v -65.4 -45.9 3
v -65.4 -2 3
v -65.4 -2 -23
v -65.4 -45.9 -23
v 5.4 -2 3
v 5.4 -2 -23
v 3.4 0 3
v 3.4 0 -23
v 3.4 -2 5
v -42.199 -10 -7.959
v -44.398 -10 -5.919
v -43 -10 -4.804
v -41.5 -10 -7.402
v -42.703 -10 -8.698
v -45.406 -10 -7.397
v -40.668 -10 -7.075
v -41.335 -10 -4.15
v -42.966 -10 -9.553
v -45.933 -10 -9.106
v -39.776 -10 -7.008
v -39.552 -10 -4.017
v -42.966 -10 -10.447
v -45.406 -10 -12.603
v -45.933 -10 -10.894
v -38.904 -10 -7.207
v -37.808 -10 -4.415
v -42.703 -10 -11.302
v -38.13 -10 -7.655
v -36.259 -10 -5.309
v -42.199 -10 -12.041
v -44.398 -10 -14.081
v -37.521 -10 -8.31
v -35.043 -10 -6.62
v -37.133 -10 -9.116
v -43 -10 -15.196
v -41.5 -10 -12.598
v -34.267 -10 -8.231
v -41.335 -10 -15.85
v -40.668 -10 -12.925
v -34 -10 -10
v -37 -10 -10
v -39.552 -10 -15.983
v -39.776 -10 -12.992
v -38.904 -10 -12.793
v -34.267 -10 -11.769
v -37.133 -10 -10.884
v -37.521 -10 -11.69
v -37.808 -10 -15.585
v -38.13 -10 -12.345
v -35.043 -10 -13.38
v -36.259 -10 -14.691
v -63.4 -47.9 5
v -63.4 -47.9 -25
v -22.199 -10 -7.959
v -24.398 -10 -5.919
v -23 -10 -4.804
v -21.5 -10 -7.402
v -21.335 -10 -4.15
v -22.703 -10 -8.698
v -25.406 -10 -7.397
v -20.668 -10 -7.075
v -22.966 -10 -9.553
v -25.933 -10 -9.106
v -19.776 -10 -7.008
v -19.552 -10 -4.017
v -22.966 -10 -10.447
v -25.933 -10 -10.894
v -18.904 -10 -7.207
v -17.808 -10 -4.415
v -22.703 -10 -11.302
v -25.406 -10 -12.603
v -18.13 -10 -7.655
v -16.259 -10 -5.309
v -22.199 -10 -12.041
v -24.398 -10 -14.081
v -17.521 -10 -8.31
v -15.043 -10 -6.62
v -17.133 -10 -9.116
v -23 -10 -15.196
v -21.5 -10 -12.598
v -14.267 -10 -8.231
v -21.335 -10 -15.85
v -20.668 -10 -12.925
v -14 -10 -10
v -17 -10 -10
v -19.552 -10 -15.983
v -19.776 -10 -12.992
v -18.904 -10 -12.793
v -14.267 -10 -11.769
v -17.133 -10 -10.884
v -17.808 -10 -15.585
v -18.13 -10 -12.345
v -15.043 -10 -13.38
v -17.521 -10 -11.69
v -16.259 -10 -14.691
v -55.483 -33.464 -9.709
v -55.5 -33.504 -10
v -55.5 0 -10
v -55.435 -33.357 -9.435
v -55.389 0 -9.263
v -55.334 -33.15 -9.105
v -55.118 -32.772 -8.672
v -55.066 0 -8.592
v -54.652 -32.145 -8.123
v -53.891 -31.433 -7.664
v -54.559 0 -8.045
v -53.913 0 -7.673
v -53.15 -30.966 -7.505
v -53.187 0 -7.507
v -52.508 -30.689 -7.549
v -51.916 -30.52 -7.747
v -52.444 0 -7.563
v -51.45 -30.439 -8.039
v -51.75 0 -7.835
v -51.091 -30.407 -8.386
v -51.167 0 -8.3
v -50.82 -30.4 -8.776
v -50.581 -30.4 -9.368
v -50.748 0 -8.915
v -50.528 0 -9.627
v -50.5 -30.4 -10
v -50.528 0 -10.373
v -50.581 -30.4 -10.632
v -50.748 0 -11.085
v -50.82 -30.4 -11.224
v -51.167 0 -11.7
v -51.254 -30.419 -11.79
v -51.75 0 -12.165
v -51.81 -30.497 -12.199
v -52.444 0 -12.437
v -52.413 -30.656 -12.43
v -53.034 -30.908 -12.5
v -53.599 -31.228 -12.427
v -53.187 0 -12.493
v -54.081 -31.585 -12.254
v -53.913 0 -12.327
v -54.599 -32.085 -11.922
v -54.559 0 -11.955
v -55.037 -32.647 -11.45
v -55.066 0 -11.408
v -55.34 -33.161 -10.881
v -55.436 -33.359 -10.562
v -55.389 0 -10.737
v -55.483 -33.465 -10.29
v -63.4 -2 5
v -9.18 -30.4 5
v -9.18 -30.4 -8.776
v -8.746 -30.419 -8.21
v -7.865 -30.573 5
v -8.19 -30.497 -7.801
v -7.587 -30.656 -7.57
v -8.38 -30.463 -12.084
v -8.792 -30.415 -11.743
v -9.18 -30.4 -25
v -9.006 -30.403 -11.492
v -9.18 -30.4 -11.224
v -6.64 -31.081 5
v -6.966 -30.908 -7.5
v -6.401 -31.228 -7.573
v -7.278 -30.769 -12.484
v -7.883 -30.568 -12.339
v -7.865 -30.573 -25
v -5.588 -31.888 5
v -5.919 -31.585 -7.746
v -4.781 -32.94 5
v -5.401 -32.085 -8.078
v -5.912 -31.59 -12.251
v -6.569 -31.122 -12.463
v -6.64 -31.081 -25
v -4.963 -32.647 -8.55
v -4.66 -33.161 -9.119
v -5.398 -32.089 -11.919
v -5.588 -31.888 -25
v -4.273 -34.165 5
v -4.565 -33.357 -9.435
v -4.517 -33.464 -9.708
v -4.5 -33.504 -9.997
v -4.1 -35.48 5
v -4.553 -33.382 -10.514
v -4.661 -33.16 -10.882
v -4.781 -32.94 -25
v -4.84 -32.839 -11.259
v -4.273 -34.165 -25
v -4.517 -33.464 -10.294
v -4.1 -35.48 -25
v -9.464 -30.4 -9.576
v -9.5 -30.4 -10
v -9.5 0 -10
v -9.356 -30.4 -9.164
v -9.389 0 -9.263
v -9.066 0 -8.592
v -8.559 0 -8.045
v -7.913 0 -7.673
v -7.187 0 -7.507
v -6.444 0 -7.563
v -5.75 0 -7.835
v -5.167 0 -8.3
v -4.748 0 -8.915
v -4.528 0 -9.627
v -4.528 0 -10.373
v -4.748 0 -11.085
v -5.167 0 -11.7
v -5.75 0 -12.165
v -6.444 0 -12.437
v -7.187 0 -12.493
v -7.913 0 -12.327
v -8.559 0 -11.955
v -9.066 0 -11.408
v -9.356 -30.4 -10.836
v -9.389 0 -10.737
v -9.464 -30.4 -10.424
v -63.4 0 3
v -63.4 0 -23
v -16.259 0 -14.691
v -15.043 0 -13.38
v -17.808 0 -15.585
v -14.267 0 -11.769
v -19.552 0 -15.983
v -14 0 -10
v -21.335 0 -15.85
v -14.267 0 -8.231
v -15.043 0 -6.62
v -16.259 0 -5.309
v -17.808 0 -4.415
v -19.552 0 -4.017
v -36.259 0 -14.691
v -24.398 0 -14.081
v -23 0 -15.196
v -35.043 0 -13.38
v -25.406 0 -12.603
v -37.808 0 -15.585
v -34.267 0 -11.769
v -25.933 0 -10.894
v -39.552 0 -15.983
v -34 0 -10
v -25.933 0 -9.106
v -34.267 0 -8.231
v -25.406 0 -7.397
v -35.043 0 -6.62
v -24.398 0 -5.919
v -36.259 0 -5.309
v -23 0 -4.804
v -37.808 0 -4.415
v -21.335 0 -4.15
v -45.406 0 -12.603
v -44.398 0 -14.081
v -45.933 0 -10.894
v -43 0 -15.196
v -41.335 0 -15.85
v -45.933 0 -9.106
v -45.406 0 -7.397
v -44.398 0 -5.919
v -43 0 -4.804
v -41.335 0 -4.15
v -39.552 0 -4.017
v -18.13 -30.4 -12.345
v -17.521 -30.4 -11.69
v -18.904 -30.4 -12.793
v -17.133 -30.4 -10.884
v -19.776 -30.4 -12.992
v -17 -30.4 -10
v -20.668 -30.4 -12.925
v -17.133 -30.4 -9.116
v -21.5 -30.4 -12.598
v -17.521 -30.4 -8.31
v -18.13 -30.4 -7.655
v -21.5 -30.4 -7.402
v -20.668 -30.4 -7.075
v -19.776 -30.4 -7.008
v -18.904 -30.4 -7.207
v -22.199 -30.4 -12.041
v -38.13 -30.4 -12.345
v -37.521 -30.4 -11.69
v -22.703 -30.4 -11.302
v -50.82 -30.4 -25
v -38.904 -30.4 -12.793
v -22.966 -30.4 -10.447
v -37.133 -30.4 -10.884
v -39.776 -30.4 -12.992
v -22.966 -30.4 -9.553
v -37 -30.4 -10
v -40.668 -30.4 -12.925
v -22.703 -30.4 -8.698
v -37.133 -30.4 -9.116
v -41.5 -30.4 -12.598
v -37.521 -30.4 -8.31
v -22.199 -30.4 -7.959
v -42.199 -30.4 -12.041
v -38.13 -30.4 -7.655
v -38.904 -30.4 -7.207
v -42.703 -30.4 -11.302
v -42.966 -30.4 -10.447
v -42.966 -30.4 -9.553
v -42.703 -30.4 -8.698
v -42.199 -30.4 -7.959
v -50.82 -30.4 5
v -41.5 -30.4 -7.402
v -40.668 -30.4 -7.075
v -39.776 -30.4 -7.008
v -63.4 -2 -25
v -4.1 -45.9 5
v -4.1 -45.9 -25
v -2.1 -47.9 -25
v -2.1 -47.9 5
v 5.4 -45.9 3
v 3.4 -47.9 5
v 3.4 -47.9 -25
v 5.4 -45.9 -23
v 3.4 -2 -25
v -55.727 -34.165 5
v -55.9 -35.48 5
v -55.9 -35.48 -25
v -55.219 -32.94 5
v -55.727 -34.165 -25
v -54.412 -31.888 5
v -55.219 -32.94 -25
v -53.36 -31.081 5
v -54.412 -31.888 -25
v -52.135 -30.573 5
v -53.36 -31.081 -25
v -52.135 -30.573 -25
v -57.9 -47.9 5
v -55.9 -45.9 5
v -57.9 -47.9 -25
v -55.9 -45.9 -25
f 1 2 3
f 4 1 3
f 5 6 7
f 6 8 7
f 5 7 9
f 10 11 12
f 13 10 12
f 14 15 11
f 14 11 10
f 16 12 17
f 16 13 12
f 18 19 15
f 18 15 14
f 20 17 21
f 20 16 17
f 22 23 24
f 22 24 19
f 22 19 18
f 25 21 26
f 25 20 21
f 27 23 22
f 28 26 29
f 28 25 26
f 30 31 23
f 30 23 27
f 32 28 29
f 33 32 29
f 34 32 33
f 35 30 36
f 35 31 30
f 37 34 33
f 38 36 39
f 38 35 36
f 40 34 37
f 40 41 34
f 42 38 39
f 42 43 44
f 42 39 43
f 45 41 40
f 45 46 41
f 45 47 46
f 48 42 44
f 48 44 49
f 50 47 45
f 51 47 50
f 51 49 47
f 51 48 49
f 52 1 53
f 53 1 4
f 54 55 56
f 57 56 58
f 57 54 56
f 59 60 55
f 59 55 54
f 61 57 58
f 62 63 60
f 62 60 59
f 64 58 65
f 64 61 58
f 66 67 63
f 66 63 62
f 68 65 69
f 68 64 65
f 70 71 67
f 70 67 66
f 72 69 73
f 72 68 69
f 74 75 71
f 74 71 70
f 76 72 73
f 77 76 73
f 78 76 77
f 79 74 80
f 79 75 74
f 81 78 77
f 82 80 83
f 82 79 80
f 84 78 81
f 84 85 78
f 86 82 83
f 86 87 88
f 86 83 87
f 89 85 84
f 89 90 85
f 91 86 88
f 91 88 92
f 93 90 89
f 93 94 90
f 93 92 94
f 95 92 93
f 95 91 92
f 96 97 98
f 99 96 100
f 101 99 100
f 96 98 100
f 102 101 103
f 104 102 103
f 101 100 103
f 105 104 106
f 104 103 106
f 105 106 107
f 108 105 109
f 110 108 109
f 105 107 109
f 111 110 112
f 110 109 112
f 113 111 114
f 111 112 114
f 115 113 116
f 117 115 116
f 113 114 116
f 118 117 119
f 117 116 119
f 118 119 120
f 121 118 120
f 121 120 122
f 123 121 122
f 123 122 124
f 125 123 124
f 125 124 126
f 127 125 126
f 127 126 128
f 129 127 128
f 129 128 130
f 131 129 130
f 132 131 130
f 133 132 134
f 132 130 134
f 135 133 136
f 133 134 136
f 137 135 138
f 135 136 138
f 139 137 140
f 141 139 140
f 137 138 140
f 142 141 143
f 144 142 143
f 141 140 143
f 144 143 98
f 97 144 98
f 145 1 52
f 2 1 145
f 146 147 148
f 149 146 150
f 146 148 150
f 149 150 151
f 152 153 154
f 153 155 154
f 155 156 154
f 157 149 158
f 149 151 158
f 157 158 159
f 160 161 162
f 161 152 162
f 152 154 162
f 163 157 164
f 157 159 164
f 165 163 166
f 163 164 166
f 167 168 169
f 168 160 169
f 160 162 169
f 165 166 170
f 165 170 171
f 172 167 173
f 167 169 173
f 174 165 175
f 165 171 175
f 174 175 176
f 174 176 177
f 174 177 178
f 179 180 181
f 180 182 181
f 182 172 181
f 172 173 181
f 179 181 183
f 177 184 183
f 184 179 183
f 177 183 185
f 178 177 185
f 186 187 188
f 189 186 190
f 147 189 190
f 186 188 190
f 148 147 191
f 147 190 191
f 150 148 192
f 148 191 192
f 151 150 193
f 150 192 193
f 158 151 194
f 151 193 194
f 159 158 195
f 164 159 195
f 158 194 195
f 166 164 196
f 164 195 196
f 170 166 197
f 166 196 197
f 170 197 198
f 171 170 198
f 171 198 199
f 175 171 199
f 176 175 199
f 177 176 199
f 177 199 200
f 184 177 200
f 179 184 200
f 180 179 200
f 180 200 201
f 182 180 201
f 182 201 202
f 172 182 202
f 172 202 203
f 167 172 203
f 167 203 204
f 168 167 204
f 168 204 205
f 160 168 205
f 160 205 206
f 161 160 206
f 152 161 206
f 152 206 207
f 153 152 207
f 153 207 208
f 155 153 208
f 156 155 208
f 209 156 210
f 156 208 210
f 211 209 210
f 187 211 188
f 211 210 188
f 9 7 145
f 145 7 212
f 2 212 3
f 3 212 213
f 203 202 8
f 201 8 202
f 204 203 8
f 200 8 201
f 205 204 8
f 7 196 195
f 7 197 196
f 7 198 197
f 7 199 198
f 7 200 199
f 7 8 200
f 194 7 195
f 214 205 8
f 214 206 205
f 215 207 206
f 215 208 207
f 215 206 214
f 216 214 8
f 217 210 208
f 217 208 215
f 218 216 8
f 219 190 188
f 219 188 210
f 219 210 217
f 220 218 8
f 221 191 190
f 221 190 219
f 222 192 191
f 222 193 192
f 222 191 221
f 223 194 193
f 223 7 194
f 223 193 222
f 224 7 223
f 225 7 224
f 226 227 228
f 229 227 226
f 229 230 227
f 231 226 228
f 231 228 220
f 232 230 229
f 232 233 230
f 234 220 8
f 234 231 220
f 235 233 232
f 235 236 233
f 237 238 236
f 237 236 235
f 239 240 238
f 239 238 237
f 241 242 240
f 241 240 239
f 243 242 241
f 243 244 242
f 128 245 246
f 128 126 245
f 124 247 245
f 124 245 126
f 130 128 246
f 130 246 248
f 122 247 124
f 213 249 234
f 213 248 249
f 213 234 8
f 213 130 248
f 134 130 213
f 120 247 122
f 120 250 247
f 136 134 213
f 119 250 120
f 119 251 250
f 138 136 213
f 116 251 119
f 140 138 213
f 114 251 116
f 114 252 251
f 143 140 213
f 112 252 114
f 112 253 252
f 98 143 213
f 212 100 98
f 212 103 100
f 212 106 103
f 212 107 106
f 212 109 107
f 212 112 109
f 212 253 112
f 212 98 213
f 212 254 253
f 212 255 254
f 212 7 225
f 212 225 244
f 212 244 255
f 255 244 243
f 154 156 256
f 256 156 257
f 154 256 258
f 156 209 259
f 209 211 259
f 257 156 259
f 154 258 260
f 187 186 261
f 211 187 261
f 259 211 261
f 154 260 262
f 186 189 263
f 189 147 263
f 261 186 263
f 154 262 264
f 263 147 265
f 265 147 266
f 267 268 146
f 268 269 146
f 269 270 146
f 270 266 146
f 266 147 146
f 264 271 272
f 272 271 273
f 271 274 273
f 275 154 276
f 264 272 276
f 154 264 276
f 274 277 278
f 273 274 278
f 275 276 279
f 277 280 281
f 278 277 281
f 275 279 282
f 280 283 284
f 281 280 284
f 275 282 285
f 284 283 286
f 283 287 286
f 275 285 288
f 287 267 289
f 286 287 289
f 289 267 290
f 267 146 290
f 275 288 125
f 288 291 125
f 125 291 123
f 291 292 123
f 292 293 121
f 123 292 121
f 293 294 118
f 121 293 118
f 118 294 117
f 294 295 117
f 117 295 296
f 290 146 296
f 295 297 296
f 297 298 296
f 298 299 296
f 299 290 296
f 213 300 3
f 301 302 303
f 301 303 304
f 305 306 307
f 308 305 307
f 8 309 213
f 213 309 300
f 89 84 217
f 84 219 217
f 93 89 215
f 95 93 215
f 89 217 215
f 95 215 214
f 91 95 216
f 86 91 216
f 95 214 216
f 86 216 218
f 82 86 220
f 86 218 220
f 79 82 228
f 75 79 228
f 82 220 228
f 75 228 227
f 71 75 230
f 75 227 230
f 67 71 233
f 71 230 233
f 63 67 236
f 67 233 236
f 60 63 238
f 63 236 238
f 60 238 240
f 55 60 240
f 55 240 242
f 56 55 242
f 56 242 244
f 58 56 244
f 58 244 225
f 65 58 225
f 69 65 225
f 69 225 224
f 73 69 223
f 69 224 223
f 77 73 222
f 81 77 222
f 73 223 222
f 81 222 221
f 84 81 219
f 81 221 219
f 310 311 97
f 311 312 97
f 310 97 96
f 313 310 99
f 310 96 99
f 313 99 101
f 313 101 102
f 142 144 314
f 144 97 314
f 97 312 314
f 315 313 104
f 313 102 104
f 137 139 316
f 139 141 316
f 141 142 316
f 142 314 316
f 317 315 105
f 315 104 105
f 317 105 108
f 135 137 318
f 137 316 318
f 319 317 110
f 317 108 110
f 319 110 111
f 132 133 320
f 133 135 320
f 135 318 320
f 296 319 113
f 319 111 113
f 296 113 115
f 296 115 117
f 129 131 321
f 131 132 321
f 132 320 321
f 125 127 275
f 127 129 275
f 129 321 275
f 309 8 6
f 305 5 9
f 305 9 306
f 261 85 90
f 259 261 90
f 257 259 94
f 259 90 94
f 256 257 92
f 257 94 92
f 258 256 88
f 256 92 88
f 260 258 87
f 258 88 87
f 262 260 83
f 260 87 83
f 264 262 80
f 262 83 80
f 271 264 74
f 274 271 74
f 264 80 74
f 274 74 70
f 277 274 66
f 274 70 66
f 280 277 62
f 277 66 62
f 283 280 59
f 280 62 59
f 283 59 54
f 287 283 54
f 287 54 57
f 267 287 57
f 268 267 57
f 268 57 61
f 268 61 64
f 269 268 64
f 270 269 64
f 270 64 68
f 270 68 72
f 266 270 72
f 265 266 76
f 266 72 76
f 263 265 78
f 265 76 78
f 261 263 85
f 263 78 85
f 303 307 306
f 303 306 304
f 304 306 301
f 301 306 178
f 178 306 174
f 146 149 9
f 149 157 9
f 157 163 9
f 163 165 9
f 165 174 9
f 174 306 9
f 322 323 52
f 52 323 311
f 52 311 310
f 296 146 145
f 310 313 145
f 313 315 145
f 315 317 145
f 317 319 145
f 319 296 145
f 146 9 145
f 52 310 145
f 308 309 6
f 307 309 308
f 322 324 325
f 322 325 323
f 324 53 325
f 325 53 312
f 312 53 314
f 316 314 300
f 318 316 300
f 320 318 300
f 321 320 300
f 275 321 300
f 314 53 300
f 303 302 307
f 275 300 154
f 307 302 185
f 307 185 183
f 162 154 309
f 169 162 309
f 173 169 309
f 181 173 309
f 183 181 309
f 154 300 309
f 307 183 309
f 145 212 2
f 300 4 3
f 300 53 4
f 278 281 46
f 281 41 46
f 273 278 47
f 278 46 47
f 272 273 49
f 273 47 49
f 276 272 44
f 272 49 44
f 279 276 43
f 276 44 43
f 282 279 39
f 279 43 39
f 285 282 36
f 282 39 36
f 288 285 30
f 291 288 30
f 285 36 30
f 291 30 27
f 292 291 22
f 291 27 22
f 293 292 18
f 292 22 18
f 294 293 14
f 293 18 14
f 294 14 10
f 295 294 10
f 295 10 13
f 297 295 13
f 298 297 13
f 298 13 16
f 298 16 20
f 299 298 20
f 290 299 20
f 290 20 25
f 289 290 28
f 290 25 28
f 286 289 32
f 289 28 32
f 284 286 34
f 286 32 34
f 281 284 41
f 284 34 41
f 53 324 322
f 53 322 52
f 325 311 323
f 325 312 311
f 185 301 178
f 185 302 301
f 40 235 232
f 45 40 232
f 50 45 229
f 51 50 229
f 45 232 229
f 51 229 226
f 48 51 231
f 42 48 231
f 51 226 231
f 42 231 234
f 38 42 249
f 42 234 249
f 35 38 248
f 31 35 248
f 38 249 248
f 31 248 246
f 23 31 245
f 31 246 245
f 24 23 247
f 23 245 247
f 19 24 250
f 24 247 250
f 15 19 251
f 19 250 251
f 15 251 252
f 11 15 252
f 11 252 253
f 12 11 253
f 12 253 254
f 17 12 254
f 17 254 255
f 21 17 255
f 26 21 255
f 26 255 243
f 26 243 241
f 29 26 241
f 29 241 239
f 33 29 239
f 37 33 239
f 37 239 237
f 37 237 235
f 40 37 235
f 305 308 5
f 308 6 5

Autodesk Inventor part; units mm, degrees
ref_plane "YZ Plane" through (0, 0, 0) normal (1, 0, 0) x (0, 1, 0)
ref_plane "XZ Plane" through (0, 0, 0) normal (0, 1, 0) x (-1, 0, 0)
sketch "Sketch1" plane through (0, 0, 0) normal (0, 1, 0) x (-1, 0, 0)
  line L0 (0, 0) -> (60, 0) construction
  line L1 (60, 0) -> (60, -20) construction
  line L2 (60, -20) -> (0, -20) construction
  line L3 (0, -20) -> (0, 0) construction
  line L4 (60.5, 0.5) -> (-0.5, 0.5)
  line L5 (-0.5, 0.5) -> (-0.5, -20.5)
  line L6 (-0.5, -20.5) -> (60.5, -20.5)
  line L7 (60.5, -20.5) -> (60.5, 0.5)
  circle A0 centre (53, -10) radius 2.5
  circle A1 centre (7, -10) radius 2.5
  line L8 (53, -10) -> (7, -10) construction
  point P0 (30, -10)
  point P1 (30, -20)
  point P2 (0, -10)
  dimension "d0" = 20
  dimension "d1" = 60
  dimension "d2" = 0.5
  dimension "d3" = 0.5
  dimension "d4" = 0.5
  dimension "d5" = 0.5
  dimension "d6" = 5
  dimension "d7" = 46
sketch "Sketch2" plane through (0, 0, 0) normal (0, 1, 0) x (-1, 0, 0)
  line L0 (-5.4, 5) -> (65.4, 5)
  line L1 (65.4, 5) -> (65.4, -25)
  line L2 (65.4, -25) -> (-5.4, -25)
  line L3 (-5.4, -25) -> (-5.4, 5)
  line L4 (60.5, -20.5) -> (60.5, 0.5) construction
  line L5 (-0.5, 0.5) -> (-0.5, -20.5) construction
  line L6 (-0.5, -20.5) -> (60.5, -20.5) construction
  point P0 (0, 0)
  point P1 (60.5, -10)
  point P2 (65.4, -10)
  point P3 (30, -20.5)
  point P4 (30, -25)
  dimension "d9" = 70.8
  dimension "d10" = 30
  dimension "d44" = 35.4
extrude "Extrusion1" add sketch "Sketch2" against normal blind 30.4
extrude "Extrusion3" cut sketch "Sketch1" against normal blind 43.3375 and the other way blind 30.4 contours A0 | A1
sketch "Sketch3" plane through (5.4, -30.4, -25) normal (0, 0, -1) x (1, 0, 0)
  line L0 (-70.8, 0) -> (0, 0) projected
  line L1 (0, 0) -> (0, 17.5)
  line L2 (0, 17.5) -> (-9.5, 17.5)
  line L3 (-9.5, 17.5) -> (-9.5, 5.08)
  line L4 (-14.58, 0) -> (-56.22, 0)
  line L5 (-61.3, 5.08) -> (-61.3, 17.5)
  line L6 (-61.3, 17.5) -> (-70.8, 17.5)
  line L7 (-70.8, 17.5) -> (-70.8, 0)
  arc A0 (-14.58, 0) -> (-9.5, 5.08) centre (-14.58, 5.08) ccw
  arc A1 (-61.3, 5.08) -> (-56.22, 0) centre (-56.22, 5.08) ccw
  point P0 (-9.5, 0)
  point P1 (-61.3, 0)
  point P2 (-61.3, 11.29)
  point P3 (-9.5, 11.29)
  point P4 (-4.75, 17.5)
  dimension "d94" = 51.8
  dimension "d95" = 17.5
  dimension "d96" = 5.08
extrude "Extrusion4" add sketch "Sketch3" against normal up to surface (30 mm away)
ref_plane "Work Plane3" through (-49.05, -33.575, -1214.2) normal (0, -1, 0) x (1, 0, 0)
sketch "Sketch4" plane through (0, 0, 0) normal (0, 1, 0) x (1, 0, 0)
  line L0 (-60.5, 20.5) -> (0.5, 20.5) construction
  line L1 (-60.5, -0.5) -> (-60.5, 20.5) construction
  circle A0 centre (-40, 10) radius 3
  line L2 (5.4, 25) -> (-65.4, 25) projected
  line L3 (-65.4, 25) -> (-65.4, -5) projected
  circle A1 centre (-20, 10) radius 3
  line L4 (-40, 10) -> (-20, 10) construction
  point P0 (0, 0)
  point P1 (-30, 20.5)
  point P2 (-60.5, 10)
  point P3 (-65.4, 20.5)
  point P4 (5.4, 20.5)
  point P5 (-30, 20.5)
  point P6 (-60.5, 10)
  point P7 (-65.4, 10)
  point P8 (-30, 25)
  point P9 (-30, 10)
  dimension "d82" = 6
  dimension "d98" = 20
extrude "Extrusion5" cut sketch "Sketch4" against normal up to surface (33.575 mm away)
extrude "Extrusion2" cut sketch "Sketch1" against normal blind 43.3375 and the other way blind 5 contours A0 | A1
sketch "Sketch8" plane through (15.4, 40, -25) normal (0, 0, -1) x (1, 0, 0)
  line L0 (25.4, 30) -> (34.4, 30)
  line L1 (34.4, 30) -> (35.4, 31)
  line L2 (35.4, 31) -> (35.4, 34)
  line L3 (35.4, 34) -> (31.95, 37.45)
  line L4 (31.95, 37.45) -> (31.95, 39.8767)
  line L5 (31.95, 39.8767) -> (33.1672, 41.0939)
  arc A0 (34.8792, 42.8058) -> (33.1672, 41.0939) centre (35.1489, 40.8241) ccw
  line L6 (34.8792, 42.8058) -> (35.4, 43.3267)
  line L7 (35.4, 43.3267) -> (35.4, 44.66)
  line L8 (35.4, 44.66) -> (34.8792, 45.1808)
  arc A1 (33.1672, 46.8928) -> (34.8792, 45.1808) centre (35.1489, 47.1626) ccw
  line L9 (33.1672, 46.8928) -> (32.56, 47.5)
  line L10 (32.56, 47.5) -> (25.4, 47.5)
  line L11 (25.4, 47.5) -> (25.4, 30) construction
  line L12 (33.1672, 41.0939) -> (34.8792, 42.8058) construction
  line L13 (33.1672, 46.8928) -> (34.8792, 45.1808) construction
  line L14 (25.4, 30) -> (16.4, 30)
  line L15 (16.4, 30) -> (15.4, 31)
  line L16 (15.4, 31) -> (15.4, 34)
  line L17 (15.4, 34) -> (18.85, 37.45)
  line L18 (18.85, 37.45) -> (18.85, 39.8767)
  line L19 (18.85, 39.8767) -> (17.6328, 41.0939)
  arc A2 (17.6328, 41.0939) -> (15.9208, 42.8058) centre (15.6511, 40.8241) ccw
  line L20 (15.9208, 42.8058) -> (15.4, 43.3267)
  line L21 (15.4, 43.3267) -> (15.4, 44.66)
  line L22 (15.4, 44.66) -> (15.9208, 45.1808)
  arc A3 (15.9208, 45.1808) -> (17.6328, 46.8928) centre (15.6511, 47.1626) ccw
  line L23 (17.6328, 46.8928) -> (18.24, 47.5)
  line L24 (18.24, 47.5) -> (25.4, 47.5)
  line L25 (17.6328, 41.0939) -> (15.9208, 42.8058) construction
  line L26 (17.6328, 46.8928) -> (15.9208, 45.1808) construction
  arc A4 (50.8, 26.825) -> (47.625, 30) centre (47.625, 26.825) ccw construction
  line L27 (34.4, 30) -> (35.4, 30)
  line L28 (3.175, 30) -> (47.625, 30) projected
  line L29 (35.4, 31) -> (35.4, 30)
  line L30 (15.4, 31) -> (15.4, 30)
  line L31 (15.4, 30) -> (16.4, 30)
  point P0 (-15.4, 40)
  point P1 (35.4, 32.5)
  dimension "d64" = 1
  dimension "d65" = 3
  dimension "d66" = 135
  dimension "d67" = 2
  dimension "d69" = 3.45
  dimension "d71" = 17.5
  dimension "d72" = 7.16
  dimension "d73" = 2.375
  dimension "d74" = 1.3333
  dimension "d75" = 2.4211
  dimension "d76" = 15.4
  dimension "d77" = 10
extrude "Extrusion8" [suppressed]
thicken "Thicken1" [suppressed]
sketch "Sketch11" plane through (0, 0, 0) normal (0, 1, 0) x (1, 0, 0)
  circle A0 centre (-20, 10) radius 6
  circle A1 centre (-40, 10) radius 3 projected
  circle A2 centre (-20, 10) radius 3 projected
  circle A3 centre (-40, 10) radius 6
  point P0 (0, 0)
  dimension "d99" = 12
extrude "Extrusion11" cut sketch "Sketch11" against normal blind 10 contours A0 | A1 | A2 | A3
chamfer "Chamfer1" distance 2 angle 45 12 edges at (5.4, 0, -10) (-30, 0, -25) (5.4, -23.95, -25) (-65.4, -23.95, -25) (-55.9, -47.9, -10) (5.4, -47.9, -10) (-30, 0, 5) (-65.4, 0, -10) (-65.4, -23.95, 5) (-65.4, -47.9, -10) (-4.1, -47.9, -10) (5.4, -23.95, 5)
properties part number "BK12_Spacer"
